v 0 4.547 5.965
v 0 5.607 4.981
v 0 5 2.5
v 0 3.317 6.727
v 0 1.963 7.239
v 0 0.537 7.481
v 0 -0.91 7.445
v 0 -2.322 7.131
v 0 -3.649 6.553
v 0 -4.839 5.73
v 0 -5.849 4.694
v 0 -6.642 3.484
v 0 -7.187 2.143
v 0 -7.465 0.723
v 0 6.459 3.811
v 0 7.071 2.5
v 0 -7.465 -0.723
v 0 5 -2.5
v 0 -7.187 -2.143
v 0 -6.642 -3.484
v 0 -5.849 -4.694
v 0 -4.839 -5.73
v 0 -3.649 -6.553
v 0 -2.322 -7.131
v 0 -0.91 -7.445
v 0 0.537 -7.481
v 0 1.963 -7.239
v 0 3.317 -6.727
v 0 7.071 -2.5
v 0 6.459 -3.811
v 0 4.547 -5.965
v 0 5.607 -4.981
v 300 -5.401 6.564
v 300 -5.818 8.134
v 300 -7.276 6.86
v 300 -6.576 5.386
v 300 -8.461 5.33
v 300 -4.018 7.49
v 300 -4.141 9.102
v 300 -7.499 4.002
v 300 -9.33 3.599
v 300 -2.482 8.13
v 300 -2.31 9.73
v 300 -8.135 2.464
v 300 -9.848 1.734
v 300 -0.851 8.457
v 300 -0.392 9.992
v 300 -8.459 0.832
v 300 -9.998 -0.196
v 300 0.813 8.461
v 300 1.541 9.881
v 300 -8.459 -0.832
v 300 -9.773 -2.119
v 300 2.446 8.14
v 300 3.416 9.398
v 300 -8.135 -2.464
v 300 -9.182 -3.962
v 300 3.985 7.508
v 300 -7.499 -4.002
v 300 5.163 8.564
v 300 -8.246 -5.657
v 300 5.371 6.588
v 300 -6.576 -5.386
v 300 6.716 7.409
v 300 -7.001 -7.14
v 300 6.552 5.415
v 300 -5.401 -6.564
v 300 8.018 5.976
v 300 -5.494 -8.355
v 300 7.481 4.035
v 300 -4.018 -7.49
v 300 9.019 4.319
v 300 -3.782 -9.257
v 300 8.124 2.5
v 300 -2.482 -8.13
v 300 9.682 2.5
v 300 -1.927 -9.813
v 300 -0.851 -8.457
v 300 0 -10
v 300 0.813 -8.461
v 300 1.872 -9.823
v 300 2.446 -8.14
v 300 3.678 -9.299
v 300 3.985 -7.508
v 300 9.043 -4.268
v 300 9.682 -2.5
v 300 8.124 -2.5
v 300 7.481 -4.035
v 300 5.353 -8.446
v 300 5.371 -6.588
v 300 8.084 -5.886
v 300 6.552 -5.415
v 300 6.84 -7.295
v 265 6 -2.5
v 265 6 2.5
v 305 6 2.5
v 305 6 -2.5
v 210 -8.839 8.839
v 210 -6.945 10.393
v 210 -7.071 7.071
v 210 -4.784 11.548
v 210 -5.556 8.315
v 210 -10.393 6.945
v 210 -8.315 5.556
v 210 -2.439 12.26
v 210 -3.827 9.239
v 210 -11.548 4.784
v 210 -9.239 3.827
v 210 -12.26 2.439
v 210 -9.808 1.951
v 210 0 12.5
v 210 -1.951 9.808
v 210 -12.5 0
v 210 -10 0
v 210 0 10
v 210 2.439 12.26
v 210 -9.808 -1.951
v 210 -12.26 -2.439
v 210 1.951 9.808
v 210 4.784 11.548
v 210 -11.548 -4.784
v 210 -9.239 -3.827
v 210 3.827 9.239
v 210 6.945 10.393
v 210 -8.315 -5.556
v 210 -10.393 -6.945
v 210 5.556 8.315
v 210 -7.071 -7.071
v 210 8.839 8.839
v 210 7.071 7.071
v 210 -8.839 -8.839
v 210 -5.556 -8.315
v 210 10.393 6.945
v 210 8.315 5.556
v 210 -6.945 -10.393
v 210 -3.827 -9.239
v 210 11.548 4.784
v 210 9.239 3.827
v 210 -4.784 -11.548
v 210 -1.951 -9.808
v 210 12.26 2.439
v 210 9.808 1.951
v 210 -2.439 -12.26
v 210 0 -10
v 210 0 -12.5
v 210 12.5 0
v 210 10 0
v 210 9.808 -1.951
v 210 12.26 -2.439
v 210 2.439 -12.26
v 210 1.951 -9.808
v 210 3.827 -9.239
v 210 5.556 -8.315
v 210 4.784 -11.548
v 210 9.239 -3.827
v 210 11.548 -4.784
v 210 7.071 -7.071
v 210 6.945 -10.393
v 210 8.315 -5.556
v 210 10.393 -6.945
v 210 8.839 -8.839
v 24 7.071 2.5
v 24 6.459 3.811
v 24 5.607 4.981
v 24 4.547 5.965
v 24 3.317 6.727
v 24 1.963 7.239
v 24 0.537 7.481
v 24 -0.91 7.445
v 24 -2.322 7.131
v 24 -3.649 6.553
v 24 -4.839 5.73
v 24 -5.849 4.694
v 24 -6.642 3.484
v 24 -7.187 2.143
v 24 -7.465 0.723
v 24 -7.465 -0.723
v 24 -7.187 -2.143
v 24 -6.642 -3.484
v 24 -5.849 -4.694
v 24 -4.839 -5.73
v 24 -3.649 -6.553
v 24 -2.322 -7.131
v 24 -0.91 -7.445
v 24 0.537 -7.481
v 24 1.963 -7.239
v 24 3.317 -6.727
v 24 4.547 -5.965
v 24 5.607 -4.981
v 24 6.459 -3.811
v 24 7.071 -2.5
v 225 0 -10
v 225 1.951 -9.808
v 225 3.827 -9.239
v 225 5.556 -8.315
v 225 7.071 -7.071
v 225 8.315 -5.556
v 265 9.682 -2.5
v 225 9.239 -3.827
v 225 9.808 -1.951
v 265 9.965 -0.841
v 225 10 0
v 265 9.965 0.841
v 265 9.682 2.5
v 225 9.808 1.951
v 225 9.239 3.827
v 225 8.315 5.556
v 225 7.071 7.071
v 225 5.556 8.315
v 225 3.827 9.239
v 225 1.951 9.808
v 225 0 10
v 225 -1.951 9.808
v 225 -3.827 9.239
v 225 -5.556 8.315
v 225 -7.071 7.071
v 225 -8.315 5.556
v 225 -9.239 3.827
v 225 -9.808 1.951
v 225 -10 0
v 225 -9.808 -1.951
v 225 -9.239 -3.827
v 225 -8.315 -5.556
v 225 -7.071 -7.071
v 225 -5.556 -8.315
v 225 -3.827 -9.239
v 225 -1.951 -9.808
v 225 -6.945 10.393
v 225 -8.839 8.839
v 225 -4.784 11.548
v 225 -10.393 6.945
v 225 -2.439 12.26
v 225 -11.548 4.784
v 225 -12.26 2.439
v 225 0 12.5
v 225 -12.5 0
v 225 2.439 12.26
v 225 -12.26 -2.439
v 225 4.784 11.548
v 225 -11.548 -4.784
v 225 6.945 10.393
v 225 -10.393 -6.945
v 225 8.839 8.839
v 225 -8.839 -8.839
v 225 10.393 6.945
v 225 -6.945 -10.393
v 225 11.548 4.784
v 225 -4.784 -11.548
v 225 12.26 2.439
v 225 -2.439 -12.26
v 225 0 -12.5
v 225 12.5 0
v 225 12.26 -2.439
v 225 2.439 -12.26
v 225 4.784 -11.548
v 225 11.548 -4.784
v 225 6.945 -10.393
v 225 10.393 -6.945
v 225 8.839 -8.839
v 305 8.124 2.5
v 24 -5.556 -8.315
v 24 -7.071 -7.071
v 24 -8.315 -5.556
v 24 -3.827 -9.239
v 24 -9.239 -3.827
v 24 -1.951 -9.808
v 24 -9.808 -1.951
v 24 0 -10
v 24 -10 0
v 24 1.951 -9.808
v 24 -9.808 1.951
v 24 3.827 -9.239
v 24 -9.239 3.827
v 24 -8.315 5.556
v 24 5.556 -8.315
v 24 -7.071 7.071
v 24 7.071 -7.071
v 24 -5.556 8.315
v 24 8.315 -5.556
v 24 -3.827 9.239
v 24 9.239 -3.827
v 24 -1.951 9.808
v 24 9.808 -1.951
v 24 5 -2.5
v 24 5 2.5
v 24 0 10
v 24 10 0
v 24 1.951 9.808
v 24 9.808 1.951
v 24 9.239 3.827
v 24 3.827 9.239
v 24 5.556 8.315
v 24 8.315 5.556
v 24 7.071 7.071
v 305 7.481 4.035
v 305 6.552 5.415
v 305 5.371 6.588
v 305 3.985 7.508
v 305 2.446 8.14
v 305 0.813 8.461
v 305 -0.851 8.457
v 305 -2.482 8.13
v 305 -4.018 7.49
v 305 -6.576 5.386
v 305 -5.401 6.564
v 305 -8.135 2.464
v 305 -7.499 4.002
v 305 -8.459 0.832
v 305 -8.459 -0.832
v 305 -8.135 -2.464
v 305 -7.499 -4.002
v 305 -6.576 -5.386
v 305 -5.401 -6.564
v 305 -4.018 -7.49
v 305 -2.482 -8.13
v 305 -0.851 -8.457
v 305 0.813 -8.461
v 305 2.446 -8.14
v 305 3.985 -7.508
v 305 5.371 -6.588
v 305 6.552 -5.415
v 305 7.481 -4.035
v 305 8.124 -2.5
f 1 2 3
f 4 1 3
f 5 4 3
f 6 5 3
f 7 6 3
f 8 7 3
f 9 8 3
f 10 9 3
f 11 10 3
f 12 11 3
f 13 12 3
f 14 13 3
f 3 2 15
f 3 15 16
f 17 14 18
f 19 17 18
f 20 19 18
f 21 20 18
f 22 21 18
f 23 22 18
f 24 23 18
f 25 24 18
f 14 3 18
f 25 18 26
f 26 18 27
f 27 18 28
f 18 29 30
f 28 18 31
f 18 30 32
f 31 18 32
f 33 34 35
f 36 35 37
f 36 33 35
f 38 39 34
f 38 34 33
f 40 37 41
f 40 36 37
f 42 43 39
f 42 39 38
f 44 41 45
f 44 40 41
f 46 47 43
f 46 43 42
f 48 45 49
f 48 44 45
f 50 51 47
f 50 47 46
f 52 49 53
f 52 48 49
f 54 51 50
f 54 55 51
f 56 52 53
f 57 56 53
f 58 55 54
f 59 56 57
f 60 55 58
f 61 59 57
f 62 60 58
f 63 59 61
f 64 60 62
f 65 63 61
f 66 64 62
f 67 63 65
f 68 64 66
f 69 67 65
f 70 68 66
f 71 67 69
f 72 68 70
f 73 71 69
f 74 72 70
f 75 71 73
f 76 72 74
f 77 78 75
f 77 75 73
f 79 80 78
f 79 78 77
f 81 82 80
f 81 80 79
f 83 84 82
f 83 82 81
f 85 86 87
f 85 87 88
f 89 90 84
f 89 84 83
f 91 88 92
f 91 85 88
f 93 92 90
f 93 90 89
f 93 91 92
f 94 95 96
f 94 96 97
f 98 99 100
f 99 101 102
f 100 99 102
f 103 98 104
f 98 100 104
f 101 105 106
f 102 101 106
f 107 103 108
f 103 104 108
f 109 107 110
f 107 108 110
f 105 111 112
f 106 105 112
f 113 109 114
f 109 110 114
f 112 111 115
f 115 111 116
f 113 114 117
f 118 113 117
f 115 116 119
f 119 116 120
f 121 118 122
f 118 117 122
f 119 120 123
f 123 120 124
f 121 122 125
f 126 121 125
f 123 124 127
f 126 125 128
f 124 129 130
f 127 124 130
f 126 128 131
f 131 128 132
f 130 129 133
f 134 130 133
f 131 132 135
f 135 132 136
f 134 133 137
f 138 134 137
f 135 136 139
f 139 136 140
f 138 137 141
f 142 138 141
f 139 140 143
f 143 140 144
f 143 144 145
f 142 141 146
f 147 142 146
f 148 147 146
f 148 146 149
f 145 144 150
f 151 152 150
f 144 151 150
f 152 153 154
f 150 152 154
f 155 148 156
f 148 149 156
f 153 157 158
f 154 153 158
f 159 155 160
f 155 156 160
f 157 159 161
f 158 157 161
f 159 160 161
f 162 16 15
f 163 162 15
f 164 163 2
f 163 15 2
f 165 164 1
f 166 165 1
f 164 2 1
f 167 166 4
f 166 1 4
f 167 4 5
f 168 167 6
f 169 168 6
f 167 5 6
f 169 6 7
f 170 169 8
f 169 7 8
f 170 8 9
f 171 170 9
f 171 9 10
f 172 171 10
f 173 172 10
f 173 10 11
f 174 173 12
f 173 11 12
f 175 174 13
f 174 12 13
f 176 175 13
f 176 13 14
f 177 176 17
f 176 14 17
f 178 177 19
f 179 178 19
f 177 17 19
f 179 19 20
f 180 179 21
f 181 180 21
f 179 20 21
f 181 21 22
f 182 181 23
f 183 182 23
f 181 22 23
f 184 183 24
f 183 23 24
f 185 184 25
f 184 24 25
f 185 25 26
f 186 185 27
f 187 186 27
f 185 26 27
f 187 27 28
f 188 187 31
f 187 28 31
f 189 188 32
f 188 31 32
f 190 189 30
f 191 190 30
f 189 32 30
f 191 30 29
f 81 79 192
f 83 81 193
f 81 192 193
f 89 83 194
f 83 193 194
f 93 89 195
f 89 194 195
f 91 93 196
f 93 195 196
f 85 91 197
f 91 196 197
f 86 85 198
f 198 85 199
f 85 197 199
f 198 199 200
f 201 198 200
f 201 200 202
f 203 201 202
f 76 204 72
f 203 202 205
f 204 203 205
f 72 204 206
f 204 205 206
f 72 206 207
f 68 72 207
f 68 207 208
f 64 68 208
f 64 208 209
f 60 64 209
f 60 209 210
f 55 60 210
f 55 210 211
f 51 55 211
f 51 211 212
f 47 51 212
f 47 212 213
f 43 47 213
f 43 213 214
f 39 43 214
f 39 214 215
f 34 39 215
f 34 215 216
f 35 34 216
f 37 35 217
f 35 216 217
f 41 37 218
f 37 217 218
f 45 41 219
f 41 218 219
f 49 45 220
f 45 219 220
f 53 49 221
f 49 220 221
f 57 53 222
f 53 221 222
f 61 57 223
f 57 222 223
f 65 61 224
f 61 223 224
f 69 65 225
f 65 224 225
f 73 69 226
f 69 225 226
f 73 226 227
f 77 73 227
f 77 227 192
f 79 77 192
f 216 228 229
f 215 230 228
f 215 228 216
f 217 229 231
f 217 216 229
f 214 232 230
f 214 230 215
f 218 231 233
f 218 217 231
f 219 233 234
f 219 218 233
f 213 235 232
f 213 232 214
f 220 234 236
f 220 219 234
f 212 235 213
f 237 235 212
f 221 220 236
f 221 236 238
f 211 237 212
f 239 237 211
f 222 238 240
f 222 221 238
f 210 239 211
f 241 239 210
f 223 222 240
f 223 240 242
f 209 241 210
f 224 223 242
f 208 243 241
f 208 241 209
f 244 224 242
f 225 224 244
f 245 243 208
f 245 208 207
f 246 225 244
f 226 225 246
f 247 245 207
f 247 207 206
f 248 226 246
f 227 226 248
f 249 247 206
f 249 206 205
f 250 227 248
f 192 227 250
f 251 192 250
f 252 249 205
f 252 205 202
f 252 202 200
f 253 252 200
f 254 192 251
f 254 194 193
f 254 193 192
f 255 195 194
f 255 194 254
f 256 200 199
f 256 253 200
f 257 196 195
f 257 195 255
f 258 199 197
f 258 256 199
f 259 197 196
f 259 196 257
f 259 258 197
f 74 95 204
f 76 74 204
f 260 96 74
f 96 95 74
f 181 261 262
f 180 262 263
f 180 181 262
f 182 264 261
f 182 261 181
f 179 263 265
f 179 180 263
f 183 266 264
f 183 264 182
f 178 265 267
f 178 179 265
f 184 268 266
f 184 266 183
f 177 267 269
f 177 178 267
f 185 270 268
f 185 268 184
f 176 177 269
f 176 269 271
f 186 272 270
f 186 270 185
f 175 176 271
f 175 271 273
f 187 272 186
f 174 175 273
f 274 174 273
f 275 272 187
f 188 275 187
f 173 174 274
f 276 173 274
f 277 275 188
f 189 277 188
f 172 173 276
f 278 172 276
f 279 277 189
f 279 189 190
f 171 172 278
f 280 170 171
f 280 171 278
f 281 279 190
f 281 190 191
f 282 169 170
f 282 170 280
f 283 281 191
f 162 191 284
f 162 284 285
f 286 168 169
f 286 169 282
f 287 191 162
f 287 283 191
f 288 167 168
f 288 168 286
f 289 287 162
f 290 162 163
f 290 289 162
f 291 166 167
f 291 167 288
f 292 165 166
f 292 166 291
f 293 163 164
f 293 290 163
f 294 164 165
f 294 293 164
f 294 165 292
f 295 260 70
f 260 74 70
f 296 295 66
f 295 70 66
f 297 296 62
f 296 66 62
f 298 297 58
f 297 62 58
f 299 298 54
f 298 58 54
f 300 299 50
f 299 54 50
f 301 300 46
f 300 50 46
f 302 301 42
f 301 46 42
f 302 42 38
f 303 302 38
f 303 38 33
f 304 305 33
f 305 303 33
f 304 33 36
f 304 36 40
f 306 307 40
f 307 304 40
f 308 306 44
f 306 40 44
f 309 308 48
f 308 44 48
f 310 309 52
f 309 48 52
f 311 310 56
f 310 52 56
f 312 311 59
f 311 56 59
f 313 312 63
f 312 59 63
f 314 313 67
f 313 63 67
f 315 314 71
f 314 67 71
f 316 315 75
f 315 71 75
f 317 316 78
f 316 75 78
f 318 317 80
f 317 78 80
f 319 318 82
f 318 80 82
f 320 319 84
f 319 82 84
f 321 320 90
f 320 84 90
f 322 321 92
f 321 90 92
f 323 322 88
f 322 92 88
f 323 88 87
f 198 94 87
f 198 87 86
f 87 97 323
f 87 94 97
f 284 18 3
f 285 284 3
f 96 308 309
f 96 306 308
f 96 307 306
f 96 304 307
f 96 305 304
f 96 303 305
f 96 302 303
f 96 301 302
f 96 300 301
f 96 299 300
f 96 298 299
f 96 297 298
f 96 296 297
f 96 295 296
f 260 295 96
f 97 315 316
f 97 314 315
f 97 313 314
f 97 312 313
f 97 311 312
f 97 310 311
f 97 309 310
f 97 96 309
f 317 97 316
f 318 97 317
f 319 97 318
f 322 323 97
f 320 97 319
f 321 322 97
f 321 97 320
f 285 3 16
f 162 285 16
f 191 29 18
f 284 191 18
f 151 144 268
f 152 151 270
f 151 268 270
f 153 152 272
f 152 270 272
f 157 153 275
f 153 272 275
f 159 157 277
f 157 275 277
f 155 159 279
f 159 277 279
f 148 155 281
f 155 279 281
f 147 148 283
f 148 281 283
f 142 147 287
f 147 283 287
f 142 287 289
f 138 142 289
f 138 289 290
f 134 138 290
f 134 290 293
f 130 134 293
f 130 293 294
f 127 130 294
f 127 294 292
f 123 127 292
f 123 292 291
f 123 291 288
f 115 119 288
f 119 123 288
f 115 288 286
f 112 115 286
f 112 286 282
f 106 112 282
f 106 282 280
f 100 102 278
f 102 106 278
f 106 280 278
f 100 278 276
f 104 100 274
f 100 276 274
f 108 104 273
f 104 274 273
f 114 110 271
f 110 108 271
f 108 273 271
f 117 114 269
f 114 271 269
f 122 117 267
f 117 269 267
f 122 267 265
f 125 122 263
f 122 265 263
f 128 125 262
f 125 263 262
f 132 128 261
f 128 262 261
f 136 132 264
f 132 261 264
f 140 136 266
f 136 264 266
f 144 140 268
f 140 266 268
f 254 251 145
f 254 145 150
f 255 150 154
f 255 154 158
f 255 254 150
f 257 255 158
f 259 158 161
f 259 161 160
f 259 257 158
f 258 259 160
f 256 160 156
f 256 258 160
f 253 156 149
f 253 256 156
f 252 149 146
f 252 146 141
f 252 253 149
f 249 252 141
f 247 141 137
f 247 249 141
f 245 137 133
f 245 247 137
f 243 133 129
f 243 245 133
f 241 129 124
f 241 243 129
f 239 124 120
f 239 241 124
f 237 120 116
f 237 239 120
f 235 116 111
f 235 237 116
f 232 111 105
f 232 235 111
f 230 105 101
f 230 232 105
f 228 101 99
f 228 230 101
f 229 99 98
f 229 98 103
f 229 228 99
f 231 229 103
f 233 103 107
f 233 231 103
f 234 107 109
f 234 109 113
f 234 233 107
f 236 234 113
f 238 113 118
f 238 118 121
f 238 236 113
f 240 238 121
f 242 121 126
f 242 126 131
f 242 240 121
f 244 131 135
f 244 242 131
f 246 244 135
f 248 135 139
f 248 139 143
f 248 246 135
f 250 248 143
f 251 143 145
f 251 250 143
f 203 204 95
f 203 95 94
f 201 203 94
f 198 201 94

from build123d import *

# Parameters (mm, degrees)
SKETCH1_R           = 10
BOSS_EXTRUDE1_DEPTH = 300
SKETCH2_R           = 8.5
BOSS_EXTRUDE2_DEPTH = 5
SKETCH6_R           = 10
CUT_EXTRUDE2_DEPTH  = 24
SKETCH7_W           = 5
SKETCH7_H           = 5
CUT_EXTRUDE3_DEPTH  = 40
SKETCH10_R          = 12.5
BOSS_EXTRUDE4_DEPTH = 15


with BuildPart() as part:
    # Sketch1 → Boss-Extrude1 (new body)
    with BuildSketch(Plane(origin=(0, 0, 0), x_dir=(0, 0, -1), z_dir=(1, 0, 0))):
        Circle(SKETCH1_R)
    extrude(amount=BOSS_EXTRUDE1_DEPTH)

    # Sketch2 → Boss-Extrude2 (add)
    with BuildSketch(Plane(origin=(300, 0, 0), x_dir=(0, 0, -1), z_dir=(1, 0, 0))):
        Circle(SKETCH2_R)
    extrude(amount=BOSS_EXTRUDE2_DEPTH)

    # Sketch6 → Cut-Extrude2 (cut)
    with BuildSketch(Plane.ZY):
        Circle(SKETCH6_R)
        with BuildLine():
            Line((-2.5, 7.071067812), (-2.5, 5))
            Line((-2.5, 5), (2.5, 5))
            Line((2.5, 5), (2.5, 7.071067812))
            ThreePointArc((2.5, 7.071067812), (0, -7.5), (-2.5, 7.071067812))
        make_face(mode=Mode.SUBTRACT)
    extrude(amount=-CUT_EXTRUDE2_DEPTH, mode=Mode.SUBTRACT)

    # Sketch7 → Cut-Extrude3 (cut)
    with BuildSketch(Plane(origin=(305, 0, 0), x_dir=(0, 0, -1), z_dir=(1, 0, 0))):
        with Locations((0, 8.5)):
            Rectangle(SKETCH7_W, SKETCH7_H)
    extrude(amount=-CUT_EXTRUDE3_DEPTH, mode=Mode.SUBTRACT)

    # Sketch10 → Boss-Extrude4 (add)
    with BuildSketch(Plane(origin=(225, 0, 0), x_dir=(0, 0, -1), z_dir=(1, 0, 0))):
        Circle(SKETCH10_R)
    extrude(amount=-BOSS_EXTRUDE4_DEPTH)


solid = part.part
